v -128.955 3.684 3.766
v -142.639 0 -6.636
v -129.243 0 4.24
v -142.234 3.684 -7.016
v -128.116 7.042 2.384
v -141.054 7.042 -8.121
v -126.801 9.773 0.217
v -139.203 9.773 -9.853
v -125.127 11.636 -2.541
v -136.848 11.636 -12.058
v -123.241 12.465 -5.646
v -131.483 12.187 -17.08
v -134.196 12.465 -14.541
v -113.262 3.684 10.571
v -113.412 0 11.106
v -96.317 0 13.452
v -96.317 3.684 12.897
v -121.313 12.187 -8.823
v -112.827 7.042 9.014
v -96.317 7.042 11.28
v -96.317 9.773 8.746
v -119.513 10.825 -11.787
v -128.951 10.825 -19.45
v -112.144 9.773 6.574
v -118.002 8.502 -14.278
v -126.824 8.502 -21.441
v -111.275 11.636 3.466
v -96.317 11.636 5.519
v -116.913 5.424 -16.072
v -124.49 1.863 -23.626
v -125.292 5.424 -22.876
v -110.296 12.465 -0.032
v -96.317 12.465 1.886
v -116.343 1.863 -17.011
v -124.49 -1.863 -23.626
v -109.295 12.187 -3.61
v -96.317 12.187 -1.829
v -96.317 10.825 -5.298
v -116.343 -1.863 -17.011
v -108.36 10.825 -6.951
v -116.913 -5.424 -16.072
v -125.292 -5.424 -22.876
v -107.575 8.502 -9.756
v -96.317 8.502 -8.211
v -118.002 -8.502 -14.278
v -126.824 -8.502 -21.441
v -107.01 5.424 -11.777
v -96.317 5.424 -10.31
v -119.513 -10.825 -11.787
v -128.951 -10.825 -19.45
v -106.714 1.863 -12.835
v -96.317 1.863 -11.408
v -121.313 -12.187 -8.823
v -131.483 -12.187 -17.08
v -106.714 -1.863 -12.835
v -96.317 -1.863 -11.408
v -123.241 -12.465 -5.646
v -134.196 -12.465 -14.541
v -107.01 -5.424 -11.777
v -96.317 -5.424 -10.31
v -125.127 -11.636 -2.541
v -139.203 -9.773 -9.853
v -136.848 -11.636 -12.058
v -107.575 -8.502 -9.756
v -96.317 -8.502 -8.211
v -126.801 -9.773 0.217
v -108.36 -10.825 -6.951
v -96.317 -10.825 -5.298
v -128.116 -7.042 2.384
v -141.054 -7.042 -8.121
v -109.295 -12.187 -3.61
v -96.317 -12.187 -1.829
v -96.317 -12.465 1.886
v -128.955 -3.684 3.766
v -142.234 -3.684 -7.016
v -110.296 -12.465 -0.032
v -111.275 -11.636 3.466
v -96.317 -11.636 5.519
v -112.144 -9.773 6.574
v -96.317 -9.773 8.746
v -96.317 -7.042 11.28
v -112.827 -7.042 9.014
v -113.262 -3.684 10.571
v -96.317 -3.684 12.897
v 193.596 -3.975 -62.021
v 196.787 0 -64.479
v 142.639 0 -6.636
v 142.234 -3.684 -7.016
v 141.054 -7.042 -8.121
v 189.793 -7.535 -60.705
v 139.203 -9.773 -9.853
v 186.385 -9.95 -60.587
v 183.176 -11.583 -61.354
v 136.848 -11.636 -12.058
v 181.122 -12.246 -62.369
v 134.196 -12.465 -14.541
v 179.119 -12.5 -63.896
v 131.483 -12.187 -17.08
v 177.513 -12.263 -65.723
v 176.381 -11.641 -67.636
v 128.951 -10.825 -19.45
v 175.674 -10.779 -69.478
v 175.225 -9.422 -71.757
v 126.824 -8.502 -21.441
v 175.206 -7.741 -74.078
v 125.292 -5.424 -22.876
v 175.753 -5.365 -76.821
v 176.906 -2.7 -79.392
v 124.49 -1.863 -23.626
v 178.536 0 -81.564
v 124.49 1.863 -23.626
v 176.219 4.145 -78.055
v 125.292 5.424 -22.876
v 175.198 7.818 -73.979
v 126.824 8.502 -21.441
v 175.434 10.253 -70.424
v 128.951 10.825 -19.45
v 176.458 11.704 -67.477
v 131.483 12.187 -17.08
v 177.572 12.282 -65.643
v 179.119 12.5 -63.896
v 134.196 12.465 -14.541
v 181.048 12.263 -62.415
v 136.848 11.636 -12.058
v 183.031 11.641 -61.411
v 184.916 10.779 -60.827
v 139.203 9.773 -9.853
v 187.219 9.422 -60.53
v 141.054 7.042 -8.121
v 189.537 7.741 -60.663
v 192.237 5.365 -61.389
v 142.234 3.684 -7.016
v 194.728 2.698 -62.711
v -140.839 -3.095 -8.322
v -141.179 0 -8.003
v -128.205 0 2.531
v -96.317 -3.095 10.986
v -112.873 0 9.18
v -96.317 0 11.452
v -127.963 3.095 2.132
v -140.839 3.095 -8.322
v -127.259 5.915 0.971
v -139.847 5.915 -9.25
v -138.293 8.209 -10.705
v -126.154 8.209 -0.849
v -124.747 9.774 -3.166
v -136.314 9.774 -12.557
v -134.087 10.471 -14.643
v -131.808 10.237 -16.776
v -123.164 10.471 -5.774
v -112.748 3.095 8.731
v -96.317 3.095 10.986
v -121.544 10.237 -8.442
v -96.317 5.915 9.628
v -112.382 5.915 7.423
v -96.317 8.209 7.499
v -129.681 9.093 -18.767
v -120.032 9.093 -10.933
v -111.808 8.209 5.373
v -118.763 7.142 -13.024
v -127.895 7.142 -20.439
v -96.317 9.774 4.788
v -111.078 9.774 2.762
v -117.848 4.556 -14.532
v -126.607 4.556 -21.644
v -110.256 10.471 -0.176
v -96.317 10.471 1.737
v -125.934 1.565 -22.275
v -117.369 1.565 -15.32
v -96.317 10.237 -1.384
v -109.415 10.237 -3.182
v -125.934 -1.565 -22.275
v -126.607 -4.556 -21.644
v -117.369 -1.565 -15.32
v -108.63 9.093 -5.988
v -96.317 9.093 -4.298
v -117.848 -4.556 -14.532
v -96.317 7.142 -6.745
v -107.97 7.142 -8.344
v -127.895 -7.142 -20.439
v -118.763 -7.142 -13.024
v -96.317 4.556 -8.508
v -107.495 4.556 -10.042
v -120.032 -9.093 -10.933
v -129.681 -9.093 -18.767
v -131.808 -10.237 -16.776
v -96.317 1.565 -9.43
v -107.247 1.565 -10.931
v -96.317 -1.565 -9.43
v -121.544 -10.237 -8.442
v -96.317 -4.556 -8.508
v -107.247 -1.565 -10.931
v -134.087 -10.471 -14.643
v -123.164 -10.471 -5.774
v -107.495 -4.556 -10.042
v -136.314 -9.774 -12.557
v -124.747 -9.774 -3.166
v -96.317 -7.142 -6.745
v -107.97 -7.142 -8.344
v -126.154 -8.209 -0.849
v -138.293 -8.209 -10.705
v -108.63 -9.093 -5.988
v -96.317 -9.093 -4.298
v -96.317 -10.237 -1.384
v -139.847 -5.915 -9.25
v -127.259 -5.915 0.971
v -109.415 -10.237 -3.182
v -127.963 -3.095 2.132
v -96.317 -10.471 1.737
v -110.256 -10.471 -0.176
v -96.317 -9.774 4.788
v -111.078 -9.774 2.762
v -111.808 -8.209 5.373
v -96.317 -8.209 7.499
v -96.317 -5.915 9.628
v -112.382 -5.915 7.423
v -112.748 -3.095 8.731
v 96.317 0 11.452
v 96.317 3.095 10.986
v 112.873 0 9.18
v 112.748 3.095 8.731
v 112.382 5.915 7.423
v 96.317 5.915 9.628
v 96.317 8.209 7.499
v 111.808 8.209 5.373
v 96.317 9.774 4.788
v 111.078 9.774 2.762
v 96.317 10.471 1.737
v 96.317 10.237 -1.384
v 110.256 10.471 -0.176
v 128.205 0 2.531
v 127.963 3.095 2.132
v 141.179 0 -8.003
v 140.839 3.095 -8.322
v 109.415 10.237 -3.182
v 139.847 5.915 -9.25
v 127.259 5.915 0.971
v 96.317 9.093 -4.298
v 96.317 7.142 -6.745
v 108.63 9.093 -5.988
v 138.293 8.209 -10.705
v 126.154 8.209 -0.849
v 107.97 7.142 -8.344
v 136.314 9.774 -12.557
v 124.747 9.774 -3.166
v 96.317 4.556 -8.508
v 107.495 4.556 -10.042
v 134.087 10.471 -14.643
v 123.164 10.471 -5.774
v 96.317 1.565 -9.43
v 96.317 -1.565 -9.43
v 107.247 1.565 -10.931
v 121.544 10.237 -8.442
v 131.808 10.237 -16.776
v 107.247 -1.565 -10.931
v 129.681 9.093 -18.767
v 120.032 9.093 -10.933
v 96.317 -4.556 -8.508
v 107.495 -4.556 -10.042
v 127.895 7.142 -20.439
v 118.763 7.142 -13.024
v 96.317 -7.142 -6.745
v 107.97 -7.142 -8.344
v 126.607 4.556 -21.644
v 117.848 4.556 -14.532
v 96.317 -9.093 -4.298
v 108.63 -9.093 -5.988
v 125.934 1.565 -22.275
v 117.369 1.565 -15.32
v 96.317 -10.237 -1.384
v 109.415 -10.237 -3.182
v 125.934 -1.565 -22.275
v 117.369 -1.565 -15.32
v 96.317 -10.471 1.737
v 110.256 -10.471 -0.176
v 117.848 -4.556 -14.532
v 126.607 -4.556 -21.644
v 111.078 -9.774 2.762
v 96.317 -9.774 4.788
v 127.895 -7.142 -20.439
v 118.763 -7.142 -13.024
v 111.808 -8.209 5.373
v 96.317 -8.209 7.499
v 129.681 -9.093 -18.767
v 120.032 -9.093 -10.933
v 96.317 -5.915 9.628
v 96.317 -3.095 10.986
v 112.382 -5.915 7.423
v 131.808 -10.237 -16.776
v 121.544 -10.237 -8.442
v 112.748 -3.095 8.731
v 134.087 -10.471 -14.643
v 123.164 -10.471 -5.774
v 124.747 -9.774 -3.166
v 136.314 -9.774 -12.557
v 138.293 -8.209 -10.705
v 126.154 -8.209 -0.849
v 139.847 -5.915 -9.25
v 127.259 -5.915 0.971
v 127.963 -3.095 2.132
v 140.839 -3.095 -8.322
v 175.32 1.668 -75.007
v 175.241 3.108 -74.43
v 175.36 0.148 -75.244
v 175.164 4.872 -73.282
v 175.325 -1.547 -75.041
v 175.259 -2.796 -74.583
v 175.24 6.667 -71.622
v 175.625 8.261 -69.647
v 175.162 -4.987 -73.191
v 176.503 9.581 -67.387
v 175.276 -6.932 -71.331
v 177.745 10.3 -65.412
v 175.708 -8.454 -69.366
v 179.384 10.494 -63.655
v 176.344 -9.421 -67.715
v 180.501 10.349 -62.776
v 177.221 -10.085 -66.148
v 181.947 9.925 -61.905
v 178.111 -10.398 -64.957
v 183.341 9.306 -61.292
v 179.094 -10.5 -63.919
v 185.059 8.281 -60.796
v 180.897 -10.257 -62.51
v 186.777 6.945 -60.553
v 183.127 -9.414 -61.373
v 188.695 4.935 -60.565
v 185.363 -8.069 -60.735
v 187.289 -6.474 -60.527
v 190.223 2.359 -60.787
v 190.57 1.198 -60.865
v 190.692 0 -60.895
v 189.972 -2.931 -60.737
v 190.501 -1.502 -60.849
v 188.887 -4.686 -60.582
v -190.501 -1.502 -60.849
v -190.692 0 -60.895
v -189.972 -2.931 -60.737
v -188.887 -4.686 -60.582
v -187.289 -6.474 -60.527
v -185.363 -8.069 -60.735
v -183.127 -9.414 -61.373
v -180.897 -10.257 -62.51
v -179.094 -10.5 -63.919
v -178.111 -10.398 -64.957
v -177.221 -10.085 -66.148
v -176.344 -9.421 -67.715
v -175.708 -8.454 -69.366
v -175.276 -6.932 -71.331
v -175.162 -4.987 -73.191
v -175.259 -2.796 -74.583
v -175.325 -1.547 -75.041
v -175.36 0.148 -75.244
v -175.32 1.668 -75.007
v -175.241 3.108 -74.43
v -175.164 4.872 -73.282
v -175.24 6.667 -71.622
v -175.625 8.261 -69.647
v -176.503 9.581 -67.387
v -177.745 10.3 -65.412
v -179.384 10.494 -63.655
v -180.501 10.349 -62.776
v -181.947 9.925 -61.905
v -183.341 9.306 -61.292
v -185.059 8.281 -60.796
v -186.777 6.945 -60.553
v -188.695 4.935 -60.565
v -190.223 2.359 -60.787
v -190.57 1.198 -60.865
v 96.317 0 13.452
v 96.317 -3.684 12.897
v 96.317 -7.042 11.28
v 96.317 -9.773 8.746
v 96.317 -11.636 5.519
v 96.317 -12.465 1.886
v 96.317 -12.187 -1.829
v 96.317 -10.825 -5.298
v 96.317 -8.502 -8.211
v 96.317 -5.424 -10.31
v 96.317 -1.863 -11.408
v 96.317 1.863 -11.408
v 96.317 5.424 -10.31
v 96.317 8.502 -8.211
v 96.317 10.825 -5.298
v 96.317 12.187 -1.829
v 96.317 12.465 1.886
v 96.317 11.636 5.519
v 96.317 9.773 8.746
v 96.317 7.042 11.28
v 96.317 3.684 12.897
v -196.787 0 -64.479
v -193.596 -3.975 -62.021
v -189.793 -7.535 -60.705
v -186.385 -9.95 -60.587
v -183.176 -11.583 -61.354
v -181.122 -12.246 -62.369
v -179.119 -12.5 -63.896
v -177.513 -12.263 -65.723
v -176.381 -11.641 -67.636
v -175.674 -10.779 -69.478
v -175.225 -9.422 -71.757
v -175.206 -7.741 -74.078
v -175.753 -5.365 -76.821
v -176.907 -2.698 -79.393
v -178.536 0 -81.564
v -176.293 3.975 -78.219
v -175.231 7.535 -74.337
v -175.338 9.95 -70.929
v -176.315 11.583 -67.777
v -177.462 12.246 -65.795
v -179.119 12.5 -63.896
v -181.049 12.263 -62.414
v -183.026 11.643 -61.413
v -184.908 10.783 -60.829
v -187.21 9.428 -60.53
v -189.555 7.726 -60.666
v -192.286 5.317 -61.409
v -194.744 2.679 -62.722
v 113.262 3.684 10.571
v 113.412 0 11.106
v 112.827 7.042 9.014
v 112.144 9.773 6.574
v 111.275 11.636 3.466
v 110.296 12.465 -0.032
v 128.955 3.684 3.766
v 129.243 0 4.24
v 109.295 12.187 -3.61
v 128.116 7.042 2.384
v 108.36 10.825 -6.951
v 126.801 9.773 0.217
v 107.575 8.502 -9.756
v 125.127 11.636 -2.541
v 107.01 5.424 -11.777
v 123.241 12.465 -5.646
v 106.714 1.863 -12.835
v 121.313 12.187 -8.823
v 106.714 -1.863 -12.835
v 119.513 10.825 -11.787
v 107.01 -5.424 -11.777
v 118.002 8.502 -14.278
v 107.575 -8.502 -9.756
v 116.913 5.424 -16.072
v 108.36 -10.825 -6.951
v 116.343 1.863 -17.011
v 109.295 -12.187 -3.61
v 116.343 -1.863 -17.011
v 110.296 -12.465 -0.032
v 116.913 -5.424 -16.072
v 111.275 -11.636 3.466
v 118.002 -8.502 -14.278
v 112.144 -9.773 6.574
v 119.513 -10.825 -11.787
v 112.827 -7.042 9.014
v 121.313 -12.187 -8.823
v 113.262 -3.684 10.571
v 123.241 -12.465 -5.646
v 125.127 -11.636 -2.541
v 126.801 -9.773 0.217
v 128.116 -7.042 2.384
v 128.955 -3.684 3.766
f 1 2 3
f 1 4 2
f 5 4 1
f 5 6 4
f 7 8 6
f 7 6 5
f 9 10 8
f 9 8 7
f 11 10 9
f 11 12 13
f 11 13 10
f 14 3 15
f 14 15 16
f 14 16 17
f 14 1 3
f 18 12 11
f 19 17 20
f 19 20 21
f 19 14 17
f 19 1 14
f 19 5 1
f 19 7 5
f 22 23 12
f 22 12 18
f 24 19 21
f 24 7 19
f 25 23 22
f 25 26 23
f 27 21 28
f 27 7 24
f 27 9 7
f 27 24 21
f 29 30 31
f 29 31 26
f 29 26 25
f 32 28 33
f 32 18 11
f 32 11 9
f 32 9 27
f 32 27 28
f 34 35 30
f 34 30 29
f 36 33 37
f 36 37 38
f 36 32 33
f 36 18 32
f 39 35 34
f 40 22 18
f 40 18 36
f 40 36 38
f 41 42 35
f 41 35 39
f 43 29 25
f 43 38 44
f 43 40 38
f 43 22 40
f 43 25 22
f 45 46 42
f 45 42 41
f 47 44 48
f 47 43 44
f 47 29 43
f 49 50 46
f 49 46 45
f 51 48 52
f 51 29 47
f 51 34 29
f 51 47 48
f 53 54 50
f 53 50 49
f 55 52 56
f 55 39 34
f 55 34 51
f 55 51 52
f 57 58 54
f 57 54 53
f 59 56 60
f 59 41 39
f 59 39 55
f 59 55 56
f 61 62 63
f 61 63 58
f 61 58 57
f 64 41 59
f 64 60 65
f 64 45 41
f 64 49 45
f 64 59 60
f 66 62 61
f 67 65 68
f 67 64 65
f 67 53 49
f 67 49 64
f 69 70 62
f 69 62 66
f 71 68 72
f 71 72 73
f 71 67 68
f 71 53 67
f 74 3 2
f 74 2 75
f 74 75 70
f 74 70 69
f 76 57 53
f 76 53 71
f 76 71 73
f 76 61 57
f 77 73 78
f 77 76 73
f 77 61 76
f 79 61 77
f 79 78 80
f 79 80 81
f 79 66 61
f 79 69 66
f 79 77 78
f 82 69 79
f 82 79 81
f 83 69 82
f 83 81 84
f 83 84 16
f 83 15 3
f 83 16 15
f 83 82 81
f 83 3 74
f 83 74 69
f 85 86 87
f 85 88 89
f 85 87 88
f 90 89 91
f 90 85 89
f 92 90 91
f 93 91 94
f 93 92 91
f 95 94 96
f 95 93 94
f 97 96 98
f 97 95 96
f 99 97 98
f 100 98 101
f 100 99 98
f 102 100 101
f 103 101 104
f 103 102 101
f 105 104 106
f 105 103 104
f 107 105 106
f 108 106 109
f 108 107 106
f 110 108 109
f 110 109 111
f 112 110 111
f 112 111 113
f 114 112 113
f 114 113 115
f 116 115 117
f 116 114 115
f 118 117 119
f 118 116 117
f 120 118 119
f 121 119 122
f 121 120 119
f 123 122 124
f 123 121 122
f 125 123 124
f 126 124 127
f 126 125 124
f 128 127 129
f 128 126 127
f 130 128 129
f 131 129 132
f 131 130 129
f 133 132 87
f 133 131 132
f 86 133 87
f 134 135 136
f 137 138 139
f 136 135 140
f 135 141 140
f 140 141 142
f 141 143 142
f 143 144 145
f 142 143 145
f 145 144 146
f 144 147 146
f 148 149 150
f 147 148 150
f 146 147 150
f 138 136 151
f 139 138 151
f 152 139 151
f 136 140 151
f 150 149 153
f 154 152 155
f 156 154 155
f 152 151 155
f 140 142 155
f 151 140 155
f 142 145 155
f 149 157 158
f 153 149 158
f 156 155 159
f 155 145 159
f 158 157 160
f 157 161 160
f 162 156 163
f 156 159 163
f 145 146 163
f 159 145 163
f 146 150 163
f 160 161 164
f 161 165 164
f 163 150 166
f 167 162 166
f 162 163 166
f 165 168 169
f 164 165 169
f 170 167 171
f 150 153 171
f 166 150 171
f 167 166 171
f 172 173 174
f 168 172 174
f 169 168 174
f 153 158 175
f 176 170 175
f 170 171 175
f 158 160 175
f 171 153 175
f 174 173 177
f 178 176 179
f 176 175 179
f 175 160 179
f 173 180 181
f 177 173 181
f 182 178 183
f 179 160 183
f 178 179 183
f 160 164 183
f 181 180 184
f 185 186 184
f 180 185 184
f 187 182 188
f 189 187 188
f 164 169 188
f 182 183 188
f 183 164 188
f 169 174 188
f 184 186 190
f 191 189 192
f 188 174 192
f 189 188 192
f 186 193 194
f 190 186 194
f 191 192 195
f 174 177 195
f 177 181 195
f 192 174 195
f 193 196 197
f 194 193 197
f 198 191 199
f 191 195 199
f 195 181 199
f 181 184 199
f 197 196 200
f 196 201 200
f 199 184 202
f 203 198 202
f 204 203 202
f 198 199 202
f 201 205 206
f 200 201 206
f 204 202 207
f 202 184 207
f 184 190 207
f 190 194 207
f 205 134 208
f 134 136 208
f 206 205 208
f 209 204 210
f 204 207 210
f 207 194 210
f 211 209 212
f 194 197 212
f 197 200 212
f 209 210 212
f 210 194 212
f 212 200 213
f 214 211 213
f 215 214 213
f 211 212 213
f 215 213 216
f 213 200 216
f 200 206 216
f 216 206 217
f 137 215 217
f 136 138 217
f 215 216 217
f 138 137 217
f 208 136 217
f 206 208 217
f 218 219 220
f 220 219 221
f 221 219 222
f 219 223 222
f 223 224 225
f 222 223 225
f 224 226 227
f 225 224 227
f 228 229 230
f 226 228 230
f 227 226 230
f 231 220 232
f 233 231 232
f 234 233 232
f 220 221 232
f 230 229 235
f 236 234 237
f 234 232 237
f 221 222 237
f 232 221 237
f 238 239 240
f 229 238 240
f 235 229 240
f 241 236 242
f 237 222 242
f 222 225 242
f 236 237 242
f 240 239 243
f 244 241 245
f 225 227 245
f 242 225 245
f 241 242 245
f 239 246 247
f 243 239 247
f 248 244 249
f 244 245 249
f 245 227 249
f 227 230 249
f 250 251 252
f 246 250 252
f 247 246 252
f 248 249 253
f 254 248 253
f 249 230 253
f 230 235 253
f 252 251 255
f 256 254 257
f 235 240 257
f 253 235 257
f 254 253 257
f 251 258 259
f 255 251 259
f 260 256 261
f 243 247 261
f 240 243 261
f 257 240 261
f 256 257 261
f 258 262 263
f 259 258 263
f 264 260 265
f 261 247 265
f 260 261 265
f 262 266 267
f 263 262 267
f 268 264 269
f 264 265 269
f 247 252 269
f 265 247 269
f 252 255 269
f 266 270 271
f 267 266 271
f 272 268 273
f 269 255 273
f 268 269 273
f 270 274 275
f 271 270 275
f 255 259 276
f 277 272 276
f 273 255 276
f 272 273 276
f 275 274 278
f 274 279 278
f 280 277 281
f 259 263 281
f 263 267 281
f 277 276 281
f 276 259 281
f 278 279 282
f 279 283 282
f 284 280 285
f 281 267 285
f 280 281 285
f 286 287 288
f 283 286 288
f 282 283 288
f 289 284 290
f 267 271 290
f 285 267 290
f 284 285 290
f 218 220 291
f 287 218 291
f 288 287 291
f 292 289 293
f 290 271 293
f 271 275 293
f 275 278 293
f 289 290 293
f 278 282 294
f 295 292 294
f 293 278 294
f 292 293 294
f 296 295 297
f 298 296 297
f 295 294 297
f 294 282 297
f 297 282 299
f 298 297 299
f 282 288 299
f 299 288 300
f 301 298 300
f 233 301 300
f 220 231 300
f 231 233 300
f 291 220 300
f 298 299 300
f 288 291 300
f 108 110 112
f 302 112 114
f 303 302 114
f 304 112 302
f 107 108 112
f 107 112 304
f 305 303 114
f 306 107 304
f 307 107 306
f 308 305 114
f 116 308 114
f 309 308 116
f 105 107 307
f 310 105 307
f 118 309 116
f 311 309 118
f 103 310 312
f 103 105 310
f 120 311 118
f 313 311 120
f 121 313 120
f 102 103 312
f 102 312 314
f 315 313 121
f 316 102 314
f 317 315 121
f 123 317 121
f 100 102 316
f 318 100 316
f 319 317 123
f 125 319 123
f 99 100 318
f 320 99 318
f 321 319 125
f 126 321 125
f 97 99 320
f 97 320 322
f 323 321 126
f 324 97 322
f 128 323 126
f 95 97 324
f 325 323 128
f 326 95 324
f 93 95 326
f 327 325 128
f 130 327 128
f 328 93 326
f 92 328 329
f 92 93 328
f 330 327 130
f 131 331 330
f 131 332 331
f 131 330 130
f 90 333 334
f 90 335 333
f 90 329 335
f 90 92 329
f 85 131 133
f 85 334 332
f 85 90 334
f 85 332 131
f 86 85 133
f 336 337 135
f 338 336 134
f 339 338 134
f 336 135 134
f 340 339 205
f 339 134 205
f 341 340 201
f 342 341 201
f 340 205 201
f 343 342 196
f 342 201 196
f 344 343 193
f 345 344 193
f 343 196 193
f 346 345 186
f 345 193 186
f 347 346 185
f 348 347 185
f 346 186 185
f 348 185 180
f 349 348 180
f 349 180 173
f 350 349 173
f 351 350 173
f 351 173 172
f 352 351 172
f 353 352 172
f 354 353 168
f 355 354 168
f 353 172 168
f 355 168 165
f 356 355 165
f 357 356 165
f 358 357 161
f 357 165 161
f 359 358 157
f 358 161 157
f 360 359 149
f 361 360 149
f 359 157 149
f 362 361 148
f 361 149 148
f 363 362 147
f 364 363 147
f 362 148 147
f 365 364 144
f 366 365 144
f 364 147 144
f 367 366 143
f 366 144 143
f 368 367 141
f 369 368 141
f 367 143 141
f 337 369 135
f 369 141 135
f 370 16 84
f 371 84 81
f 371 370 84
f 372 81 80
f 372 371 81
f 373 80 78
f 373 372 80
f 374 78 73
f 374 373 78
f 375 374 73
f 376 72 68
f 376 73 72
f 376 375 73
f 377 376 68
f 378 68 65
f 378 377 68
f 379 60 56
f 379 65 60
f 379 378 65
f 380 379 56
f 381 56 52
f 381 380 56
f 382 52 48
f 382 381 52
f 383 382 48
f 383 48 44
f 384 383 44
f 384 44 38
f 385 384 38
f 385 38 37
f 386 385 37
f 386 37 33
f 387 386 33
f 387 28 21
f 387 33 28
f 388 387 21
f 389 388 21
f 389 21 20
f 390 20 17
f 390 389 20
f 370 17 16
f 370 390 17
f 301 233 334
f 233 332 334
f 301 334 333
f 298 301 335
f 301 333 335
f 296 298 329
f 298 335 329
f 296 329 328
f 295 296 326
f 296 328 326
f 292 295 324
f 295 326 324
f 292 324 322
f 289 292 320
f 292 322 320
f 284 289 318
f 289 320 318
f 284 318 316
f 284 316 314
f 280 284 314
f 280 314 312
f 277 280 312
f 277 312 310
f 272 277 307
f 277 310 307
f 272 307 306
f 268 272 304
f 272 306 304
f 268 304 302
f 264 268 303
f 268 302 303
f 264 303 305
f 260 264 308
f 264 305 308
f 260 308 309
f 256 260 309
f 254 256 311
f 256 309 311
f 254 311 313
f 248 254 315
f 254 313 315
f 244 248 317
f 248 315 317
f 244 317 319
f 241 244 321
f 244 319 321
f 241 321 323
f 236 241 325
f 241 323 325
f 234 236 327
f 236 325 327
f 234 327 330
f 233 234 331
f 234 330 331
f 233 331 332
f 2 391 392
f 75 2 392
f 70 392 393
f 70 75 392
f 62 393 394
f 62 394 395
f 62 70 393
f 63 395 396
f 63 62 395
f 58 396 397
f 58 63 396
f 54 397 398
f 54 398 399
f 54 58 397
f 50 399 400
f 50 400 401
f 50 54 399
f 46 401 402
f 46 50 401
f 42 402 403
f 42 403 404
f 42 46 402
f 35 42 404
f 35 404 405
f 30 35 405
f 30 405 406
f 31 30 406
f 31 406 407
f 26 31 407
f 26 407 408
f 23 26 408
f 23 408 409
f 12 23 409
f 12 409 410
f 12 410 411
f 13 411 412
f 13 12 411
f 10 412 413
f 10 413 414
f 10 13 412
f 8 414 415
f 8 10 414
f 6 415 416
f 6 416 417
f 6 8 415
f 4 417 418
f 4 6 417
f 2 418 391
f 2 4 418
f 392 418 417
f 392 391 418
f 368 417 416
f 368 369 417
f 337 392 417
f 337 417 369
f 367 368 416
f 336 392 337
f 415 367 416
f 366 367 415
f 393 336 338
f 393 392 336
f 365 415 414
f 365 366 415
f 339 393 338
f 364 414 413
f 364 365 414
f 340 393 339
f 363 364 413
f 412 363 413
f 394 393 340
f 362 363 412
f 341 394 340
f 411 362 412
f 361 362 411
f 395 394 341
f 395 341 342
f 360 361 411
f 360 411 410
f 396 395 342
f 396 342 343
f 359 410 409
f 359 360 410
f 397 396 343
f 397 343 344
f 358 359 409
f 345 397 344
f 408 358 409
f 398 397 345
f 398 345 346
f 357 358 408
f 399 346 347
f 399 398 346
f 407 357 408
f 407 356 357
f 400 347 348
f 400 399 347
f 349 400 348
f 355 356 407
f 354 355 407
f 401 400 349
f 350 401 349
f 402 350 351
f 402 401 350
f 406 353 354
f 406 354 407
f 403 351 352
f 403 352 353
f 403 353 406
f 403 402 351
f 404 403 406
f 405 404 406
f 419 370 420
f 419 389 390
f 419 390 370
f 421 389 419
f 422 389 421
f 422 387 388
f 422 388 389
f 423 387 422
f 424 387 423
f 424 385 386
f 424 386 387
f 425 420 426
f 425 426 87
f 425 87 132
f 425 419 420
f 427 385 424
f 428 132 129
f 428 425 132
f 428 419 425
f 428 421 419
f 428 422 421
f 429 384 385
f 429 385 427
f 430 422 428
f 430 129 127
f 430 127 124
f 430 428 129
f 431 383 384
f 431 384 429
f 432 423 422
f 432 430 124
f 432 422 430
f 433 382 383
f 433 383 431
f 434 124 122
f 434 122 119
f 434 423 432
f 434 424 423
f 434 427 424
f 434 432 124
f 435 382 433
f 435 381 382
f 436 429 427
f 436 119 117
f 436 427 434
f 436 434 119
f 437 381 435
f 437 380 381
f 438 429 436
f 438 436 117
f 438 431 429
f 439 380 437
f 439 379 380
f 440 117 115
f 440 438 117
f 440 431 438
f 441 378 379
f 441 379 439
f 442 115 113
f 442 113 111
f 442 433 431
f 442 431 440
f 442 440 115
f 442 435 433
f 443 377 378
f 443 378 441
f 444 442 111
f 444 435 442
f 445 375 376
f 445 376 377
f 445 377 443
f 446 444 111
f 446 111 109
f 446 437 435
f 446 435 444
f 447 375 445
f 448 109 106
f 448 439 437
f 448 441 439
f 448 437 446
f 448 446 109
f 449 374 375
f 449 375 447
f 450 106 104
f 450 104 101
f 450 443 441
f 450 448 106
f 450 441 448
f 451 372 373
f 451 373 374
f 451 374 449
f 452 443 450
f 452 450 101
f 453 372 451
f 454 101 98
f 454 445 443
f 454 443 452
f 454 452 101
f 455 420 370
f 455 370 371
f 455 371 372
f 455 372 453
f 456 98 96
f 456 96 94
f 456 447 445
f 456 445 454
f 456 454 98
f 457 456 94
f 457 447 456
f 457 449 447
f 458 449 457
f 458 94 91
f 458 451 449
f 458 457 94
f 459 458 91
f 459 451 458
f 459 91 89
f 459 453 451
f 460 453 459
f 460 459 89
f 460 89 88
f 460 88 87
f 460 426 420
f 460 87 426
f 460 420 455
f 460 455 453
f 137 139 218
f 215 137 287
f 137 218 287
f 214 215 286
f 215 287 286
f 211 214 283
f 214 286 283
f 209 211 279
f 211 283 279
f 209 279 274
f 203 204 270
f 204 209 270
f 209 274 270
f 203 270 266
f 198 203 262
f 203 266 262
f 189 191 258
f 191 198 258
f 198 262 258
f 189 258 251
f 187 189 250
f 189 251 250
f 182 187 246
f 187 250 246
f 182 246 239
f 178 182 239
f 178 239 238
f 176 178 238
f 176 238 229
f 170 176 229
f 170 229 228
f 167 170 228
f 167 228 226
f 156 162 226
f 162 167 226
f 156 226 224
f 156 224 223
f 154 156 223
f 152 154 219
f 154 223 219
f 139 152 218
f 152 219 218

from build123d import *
from build123d.topology import SkipClean

# Parameters (mm, degrees)
SKETCH_4_R          = 12.5
SKETCH_4_R_2        = 10.5
CUT_EXTRUDE_START   = -12.5000001
CUT_EXTRUDE_1_DEPTH = 25.0000001


# Read off the part's stored shape, not the designer's step: Вырез-Вытянуть1
with BuildPart() as part:
    # По траектории2: sweep along a path in Эскиз1
    with BuildLine(Plane(origin=(0, 0, 0), x_dir=(1, 0, 0), z_dir=(0, 1, 0))) as sweep_2_path:
        Line((-186.966101695, 73.672565631), (-132.818565926, 15.829831696))
        ThreePointArc((-132.818565926, 15.829831696), (-116.209877383, 4.127849745), (-96.316517235, 5.78e-07))
        Line((-96.316517235, 5.78e-07), (96.316517396, 5.78e-07))
        ThreePointArc((96.316517396, 5.78e-07), (116.209877578, 4.12784976), (132.818566138, 15.829831751))
        Line((132.818566138, 15.829831751), (186.966101695, 73.672565631))
    # Эскиз4 → По траектории2 (sweep)
    with BuildSketch(Plane(origin=(186.966101695, 0, -73.672565631), x_dir=(0.7300409748240902, 0, 0.6834033765485009), z_dir=(-0.6834033765485009, 0, 0.7300409748240902))):
        with Locations((0.952301131, 0)):
            Circle(SKETCH_4_R)
        with Locations((0.952301131, 0)):
            Circle(SKETCH_4_R_2, mode=Mode.SUBTRACT)
    sweep(path=sweep_2_path.line)

    # Вырез-Вытянуть1 outline → Вырез-Вытянуть1 (cut)
    with SkipClean():  # the faces are left unmerged after this step: merging them gives an invalid solid
        with BuildSketch(Plane(origin=(0, 0, 0), x_dir=(1, 0, 0), z_dir=(0, 1, 0)).offset(CUT_EXTRUDE_START)):
            with BuildLine():
                Line((196.786832727, 64.479217615), (178.535808357, 81.564302028))
                ThreePointArc((178.535808357, 81.564302028), (179.118778335, 63.896247636), (196.786832727, 64.479217615))
            make_face()
            with BuildLine():
                Line((-178.535808367, 81.564302042), (-196.786832713, 64.479217601))
                ThreePointArc((-196.786832713, 64.479217601), (-179.11877832, 63.896247649), (-178.535808367, 81.564302042))
            make_face()
        extrude(amount=CUT_EXTRUDE_1_DEPTH, mode=Mode.SUBTRACT)


solid = part.part
